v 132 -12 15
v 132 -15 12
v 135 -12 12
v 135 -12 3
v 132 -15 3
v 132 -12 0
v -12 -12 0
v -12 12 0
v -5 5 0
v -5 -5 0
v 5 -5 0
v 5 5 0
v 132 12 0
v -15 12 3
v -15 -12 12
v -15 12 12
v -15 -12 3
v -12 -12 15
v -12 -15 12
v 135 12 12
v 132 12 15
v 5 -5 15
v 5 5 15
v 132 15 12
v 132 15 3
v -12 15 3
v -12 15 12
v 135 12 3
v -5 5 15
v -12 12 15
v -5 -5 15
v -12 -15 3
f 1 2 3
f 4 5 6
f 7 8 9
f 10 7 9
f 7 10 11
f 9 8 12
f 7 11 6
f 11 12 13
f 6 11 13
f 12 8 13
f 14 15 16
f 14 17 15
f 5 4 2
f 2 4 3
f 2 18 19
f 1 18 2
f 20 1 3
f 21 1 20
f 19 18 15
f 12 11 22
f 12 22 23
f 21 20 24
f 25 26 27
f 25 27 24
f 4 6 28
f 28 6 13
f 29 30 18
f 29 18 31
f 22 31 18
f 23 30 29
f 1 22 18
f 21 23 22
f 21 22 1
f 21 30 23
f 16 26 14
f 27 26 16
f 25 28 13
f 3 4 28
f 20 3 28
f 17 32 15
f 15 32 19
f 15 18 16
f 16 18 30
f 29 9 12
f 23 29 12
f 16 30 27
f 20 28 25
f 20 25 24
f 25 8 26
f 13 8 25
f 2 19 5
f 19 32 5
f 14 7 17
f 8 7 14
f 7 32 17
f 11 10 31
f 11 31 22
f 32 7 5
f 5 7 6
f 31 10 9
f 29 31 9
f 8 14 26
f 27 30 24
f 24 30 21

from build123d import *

# Parameters (mm, degrees)
F0_W     = 150
F0_H     = 30
F0_W_2   = 10
F0_H_2   = 10
F1_DEPTH = 15
F2_SIZE  = 3


with BuildPart() as f1:
    # F0 (on Top) → F1 (new body)
    with BuildSketch(Plane.XY):
        with Locations((60, 0)):
            Rectangle(F0_W, F0_H)
        Rectangle(F0_W_2, F0_H_2, mode=Mode.SUBTRACT)
    extrude(amount=F1_DEPTH)

    # F2
    f2_edges = [f1.edges().sort_by_distance(p)[0] for p in [
        (60, -15, 15),
        (135, -15, 7.5),
        (60, -15, 0),
        (135, 0, 0),
        (135, 15, 7.5),
        (135, 0, 15),
        (60, 15, 15),
        (-15, 0, 15),
        (-15, -15, 7.5),
        (-15, 15, 7.5),
        (-15, 0, 0),
        (60, 15, 0),
    ]]
    chamfer(f2_edges, length=F2_SIZE)


solid = f1.part
